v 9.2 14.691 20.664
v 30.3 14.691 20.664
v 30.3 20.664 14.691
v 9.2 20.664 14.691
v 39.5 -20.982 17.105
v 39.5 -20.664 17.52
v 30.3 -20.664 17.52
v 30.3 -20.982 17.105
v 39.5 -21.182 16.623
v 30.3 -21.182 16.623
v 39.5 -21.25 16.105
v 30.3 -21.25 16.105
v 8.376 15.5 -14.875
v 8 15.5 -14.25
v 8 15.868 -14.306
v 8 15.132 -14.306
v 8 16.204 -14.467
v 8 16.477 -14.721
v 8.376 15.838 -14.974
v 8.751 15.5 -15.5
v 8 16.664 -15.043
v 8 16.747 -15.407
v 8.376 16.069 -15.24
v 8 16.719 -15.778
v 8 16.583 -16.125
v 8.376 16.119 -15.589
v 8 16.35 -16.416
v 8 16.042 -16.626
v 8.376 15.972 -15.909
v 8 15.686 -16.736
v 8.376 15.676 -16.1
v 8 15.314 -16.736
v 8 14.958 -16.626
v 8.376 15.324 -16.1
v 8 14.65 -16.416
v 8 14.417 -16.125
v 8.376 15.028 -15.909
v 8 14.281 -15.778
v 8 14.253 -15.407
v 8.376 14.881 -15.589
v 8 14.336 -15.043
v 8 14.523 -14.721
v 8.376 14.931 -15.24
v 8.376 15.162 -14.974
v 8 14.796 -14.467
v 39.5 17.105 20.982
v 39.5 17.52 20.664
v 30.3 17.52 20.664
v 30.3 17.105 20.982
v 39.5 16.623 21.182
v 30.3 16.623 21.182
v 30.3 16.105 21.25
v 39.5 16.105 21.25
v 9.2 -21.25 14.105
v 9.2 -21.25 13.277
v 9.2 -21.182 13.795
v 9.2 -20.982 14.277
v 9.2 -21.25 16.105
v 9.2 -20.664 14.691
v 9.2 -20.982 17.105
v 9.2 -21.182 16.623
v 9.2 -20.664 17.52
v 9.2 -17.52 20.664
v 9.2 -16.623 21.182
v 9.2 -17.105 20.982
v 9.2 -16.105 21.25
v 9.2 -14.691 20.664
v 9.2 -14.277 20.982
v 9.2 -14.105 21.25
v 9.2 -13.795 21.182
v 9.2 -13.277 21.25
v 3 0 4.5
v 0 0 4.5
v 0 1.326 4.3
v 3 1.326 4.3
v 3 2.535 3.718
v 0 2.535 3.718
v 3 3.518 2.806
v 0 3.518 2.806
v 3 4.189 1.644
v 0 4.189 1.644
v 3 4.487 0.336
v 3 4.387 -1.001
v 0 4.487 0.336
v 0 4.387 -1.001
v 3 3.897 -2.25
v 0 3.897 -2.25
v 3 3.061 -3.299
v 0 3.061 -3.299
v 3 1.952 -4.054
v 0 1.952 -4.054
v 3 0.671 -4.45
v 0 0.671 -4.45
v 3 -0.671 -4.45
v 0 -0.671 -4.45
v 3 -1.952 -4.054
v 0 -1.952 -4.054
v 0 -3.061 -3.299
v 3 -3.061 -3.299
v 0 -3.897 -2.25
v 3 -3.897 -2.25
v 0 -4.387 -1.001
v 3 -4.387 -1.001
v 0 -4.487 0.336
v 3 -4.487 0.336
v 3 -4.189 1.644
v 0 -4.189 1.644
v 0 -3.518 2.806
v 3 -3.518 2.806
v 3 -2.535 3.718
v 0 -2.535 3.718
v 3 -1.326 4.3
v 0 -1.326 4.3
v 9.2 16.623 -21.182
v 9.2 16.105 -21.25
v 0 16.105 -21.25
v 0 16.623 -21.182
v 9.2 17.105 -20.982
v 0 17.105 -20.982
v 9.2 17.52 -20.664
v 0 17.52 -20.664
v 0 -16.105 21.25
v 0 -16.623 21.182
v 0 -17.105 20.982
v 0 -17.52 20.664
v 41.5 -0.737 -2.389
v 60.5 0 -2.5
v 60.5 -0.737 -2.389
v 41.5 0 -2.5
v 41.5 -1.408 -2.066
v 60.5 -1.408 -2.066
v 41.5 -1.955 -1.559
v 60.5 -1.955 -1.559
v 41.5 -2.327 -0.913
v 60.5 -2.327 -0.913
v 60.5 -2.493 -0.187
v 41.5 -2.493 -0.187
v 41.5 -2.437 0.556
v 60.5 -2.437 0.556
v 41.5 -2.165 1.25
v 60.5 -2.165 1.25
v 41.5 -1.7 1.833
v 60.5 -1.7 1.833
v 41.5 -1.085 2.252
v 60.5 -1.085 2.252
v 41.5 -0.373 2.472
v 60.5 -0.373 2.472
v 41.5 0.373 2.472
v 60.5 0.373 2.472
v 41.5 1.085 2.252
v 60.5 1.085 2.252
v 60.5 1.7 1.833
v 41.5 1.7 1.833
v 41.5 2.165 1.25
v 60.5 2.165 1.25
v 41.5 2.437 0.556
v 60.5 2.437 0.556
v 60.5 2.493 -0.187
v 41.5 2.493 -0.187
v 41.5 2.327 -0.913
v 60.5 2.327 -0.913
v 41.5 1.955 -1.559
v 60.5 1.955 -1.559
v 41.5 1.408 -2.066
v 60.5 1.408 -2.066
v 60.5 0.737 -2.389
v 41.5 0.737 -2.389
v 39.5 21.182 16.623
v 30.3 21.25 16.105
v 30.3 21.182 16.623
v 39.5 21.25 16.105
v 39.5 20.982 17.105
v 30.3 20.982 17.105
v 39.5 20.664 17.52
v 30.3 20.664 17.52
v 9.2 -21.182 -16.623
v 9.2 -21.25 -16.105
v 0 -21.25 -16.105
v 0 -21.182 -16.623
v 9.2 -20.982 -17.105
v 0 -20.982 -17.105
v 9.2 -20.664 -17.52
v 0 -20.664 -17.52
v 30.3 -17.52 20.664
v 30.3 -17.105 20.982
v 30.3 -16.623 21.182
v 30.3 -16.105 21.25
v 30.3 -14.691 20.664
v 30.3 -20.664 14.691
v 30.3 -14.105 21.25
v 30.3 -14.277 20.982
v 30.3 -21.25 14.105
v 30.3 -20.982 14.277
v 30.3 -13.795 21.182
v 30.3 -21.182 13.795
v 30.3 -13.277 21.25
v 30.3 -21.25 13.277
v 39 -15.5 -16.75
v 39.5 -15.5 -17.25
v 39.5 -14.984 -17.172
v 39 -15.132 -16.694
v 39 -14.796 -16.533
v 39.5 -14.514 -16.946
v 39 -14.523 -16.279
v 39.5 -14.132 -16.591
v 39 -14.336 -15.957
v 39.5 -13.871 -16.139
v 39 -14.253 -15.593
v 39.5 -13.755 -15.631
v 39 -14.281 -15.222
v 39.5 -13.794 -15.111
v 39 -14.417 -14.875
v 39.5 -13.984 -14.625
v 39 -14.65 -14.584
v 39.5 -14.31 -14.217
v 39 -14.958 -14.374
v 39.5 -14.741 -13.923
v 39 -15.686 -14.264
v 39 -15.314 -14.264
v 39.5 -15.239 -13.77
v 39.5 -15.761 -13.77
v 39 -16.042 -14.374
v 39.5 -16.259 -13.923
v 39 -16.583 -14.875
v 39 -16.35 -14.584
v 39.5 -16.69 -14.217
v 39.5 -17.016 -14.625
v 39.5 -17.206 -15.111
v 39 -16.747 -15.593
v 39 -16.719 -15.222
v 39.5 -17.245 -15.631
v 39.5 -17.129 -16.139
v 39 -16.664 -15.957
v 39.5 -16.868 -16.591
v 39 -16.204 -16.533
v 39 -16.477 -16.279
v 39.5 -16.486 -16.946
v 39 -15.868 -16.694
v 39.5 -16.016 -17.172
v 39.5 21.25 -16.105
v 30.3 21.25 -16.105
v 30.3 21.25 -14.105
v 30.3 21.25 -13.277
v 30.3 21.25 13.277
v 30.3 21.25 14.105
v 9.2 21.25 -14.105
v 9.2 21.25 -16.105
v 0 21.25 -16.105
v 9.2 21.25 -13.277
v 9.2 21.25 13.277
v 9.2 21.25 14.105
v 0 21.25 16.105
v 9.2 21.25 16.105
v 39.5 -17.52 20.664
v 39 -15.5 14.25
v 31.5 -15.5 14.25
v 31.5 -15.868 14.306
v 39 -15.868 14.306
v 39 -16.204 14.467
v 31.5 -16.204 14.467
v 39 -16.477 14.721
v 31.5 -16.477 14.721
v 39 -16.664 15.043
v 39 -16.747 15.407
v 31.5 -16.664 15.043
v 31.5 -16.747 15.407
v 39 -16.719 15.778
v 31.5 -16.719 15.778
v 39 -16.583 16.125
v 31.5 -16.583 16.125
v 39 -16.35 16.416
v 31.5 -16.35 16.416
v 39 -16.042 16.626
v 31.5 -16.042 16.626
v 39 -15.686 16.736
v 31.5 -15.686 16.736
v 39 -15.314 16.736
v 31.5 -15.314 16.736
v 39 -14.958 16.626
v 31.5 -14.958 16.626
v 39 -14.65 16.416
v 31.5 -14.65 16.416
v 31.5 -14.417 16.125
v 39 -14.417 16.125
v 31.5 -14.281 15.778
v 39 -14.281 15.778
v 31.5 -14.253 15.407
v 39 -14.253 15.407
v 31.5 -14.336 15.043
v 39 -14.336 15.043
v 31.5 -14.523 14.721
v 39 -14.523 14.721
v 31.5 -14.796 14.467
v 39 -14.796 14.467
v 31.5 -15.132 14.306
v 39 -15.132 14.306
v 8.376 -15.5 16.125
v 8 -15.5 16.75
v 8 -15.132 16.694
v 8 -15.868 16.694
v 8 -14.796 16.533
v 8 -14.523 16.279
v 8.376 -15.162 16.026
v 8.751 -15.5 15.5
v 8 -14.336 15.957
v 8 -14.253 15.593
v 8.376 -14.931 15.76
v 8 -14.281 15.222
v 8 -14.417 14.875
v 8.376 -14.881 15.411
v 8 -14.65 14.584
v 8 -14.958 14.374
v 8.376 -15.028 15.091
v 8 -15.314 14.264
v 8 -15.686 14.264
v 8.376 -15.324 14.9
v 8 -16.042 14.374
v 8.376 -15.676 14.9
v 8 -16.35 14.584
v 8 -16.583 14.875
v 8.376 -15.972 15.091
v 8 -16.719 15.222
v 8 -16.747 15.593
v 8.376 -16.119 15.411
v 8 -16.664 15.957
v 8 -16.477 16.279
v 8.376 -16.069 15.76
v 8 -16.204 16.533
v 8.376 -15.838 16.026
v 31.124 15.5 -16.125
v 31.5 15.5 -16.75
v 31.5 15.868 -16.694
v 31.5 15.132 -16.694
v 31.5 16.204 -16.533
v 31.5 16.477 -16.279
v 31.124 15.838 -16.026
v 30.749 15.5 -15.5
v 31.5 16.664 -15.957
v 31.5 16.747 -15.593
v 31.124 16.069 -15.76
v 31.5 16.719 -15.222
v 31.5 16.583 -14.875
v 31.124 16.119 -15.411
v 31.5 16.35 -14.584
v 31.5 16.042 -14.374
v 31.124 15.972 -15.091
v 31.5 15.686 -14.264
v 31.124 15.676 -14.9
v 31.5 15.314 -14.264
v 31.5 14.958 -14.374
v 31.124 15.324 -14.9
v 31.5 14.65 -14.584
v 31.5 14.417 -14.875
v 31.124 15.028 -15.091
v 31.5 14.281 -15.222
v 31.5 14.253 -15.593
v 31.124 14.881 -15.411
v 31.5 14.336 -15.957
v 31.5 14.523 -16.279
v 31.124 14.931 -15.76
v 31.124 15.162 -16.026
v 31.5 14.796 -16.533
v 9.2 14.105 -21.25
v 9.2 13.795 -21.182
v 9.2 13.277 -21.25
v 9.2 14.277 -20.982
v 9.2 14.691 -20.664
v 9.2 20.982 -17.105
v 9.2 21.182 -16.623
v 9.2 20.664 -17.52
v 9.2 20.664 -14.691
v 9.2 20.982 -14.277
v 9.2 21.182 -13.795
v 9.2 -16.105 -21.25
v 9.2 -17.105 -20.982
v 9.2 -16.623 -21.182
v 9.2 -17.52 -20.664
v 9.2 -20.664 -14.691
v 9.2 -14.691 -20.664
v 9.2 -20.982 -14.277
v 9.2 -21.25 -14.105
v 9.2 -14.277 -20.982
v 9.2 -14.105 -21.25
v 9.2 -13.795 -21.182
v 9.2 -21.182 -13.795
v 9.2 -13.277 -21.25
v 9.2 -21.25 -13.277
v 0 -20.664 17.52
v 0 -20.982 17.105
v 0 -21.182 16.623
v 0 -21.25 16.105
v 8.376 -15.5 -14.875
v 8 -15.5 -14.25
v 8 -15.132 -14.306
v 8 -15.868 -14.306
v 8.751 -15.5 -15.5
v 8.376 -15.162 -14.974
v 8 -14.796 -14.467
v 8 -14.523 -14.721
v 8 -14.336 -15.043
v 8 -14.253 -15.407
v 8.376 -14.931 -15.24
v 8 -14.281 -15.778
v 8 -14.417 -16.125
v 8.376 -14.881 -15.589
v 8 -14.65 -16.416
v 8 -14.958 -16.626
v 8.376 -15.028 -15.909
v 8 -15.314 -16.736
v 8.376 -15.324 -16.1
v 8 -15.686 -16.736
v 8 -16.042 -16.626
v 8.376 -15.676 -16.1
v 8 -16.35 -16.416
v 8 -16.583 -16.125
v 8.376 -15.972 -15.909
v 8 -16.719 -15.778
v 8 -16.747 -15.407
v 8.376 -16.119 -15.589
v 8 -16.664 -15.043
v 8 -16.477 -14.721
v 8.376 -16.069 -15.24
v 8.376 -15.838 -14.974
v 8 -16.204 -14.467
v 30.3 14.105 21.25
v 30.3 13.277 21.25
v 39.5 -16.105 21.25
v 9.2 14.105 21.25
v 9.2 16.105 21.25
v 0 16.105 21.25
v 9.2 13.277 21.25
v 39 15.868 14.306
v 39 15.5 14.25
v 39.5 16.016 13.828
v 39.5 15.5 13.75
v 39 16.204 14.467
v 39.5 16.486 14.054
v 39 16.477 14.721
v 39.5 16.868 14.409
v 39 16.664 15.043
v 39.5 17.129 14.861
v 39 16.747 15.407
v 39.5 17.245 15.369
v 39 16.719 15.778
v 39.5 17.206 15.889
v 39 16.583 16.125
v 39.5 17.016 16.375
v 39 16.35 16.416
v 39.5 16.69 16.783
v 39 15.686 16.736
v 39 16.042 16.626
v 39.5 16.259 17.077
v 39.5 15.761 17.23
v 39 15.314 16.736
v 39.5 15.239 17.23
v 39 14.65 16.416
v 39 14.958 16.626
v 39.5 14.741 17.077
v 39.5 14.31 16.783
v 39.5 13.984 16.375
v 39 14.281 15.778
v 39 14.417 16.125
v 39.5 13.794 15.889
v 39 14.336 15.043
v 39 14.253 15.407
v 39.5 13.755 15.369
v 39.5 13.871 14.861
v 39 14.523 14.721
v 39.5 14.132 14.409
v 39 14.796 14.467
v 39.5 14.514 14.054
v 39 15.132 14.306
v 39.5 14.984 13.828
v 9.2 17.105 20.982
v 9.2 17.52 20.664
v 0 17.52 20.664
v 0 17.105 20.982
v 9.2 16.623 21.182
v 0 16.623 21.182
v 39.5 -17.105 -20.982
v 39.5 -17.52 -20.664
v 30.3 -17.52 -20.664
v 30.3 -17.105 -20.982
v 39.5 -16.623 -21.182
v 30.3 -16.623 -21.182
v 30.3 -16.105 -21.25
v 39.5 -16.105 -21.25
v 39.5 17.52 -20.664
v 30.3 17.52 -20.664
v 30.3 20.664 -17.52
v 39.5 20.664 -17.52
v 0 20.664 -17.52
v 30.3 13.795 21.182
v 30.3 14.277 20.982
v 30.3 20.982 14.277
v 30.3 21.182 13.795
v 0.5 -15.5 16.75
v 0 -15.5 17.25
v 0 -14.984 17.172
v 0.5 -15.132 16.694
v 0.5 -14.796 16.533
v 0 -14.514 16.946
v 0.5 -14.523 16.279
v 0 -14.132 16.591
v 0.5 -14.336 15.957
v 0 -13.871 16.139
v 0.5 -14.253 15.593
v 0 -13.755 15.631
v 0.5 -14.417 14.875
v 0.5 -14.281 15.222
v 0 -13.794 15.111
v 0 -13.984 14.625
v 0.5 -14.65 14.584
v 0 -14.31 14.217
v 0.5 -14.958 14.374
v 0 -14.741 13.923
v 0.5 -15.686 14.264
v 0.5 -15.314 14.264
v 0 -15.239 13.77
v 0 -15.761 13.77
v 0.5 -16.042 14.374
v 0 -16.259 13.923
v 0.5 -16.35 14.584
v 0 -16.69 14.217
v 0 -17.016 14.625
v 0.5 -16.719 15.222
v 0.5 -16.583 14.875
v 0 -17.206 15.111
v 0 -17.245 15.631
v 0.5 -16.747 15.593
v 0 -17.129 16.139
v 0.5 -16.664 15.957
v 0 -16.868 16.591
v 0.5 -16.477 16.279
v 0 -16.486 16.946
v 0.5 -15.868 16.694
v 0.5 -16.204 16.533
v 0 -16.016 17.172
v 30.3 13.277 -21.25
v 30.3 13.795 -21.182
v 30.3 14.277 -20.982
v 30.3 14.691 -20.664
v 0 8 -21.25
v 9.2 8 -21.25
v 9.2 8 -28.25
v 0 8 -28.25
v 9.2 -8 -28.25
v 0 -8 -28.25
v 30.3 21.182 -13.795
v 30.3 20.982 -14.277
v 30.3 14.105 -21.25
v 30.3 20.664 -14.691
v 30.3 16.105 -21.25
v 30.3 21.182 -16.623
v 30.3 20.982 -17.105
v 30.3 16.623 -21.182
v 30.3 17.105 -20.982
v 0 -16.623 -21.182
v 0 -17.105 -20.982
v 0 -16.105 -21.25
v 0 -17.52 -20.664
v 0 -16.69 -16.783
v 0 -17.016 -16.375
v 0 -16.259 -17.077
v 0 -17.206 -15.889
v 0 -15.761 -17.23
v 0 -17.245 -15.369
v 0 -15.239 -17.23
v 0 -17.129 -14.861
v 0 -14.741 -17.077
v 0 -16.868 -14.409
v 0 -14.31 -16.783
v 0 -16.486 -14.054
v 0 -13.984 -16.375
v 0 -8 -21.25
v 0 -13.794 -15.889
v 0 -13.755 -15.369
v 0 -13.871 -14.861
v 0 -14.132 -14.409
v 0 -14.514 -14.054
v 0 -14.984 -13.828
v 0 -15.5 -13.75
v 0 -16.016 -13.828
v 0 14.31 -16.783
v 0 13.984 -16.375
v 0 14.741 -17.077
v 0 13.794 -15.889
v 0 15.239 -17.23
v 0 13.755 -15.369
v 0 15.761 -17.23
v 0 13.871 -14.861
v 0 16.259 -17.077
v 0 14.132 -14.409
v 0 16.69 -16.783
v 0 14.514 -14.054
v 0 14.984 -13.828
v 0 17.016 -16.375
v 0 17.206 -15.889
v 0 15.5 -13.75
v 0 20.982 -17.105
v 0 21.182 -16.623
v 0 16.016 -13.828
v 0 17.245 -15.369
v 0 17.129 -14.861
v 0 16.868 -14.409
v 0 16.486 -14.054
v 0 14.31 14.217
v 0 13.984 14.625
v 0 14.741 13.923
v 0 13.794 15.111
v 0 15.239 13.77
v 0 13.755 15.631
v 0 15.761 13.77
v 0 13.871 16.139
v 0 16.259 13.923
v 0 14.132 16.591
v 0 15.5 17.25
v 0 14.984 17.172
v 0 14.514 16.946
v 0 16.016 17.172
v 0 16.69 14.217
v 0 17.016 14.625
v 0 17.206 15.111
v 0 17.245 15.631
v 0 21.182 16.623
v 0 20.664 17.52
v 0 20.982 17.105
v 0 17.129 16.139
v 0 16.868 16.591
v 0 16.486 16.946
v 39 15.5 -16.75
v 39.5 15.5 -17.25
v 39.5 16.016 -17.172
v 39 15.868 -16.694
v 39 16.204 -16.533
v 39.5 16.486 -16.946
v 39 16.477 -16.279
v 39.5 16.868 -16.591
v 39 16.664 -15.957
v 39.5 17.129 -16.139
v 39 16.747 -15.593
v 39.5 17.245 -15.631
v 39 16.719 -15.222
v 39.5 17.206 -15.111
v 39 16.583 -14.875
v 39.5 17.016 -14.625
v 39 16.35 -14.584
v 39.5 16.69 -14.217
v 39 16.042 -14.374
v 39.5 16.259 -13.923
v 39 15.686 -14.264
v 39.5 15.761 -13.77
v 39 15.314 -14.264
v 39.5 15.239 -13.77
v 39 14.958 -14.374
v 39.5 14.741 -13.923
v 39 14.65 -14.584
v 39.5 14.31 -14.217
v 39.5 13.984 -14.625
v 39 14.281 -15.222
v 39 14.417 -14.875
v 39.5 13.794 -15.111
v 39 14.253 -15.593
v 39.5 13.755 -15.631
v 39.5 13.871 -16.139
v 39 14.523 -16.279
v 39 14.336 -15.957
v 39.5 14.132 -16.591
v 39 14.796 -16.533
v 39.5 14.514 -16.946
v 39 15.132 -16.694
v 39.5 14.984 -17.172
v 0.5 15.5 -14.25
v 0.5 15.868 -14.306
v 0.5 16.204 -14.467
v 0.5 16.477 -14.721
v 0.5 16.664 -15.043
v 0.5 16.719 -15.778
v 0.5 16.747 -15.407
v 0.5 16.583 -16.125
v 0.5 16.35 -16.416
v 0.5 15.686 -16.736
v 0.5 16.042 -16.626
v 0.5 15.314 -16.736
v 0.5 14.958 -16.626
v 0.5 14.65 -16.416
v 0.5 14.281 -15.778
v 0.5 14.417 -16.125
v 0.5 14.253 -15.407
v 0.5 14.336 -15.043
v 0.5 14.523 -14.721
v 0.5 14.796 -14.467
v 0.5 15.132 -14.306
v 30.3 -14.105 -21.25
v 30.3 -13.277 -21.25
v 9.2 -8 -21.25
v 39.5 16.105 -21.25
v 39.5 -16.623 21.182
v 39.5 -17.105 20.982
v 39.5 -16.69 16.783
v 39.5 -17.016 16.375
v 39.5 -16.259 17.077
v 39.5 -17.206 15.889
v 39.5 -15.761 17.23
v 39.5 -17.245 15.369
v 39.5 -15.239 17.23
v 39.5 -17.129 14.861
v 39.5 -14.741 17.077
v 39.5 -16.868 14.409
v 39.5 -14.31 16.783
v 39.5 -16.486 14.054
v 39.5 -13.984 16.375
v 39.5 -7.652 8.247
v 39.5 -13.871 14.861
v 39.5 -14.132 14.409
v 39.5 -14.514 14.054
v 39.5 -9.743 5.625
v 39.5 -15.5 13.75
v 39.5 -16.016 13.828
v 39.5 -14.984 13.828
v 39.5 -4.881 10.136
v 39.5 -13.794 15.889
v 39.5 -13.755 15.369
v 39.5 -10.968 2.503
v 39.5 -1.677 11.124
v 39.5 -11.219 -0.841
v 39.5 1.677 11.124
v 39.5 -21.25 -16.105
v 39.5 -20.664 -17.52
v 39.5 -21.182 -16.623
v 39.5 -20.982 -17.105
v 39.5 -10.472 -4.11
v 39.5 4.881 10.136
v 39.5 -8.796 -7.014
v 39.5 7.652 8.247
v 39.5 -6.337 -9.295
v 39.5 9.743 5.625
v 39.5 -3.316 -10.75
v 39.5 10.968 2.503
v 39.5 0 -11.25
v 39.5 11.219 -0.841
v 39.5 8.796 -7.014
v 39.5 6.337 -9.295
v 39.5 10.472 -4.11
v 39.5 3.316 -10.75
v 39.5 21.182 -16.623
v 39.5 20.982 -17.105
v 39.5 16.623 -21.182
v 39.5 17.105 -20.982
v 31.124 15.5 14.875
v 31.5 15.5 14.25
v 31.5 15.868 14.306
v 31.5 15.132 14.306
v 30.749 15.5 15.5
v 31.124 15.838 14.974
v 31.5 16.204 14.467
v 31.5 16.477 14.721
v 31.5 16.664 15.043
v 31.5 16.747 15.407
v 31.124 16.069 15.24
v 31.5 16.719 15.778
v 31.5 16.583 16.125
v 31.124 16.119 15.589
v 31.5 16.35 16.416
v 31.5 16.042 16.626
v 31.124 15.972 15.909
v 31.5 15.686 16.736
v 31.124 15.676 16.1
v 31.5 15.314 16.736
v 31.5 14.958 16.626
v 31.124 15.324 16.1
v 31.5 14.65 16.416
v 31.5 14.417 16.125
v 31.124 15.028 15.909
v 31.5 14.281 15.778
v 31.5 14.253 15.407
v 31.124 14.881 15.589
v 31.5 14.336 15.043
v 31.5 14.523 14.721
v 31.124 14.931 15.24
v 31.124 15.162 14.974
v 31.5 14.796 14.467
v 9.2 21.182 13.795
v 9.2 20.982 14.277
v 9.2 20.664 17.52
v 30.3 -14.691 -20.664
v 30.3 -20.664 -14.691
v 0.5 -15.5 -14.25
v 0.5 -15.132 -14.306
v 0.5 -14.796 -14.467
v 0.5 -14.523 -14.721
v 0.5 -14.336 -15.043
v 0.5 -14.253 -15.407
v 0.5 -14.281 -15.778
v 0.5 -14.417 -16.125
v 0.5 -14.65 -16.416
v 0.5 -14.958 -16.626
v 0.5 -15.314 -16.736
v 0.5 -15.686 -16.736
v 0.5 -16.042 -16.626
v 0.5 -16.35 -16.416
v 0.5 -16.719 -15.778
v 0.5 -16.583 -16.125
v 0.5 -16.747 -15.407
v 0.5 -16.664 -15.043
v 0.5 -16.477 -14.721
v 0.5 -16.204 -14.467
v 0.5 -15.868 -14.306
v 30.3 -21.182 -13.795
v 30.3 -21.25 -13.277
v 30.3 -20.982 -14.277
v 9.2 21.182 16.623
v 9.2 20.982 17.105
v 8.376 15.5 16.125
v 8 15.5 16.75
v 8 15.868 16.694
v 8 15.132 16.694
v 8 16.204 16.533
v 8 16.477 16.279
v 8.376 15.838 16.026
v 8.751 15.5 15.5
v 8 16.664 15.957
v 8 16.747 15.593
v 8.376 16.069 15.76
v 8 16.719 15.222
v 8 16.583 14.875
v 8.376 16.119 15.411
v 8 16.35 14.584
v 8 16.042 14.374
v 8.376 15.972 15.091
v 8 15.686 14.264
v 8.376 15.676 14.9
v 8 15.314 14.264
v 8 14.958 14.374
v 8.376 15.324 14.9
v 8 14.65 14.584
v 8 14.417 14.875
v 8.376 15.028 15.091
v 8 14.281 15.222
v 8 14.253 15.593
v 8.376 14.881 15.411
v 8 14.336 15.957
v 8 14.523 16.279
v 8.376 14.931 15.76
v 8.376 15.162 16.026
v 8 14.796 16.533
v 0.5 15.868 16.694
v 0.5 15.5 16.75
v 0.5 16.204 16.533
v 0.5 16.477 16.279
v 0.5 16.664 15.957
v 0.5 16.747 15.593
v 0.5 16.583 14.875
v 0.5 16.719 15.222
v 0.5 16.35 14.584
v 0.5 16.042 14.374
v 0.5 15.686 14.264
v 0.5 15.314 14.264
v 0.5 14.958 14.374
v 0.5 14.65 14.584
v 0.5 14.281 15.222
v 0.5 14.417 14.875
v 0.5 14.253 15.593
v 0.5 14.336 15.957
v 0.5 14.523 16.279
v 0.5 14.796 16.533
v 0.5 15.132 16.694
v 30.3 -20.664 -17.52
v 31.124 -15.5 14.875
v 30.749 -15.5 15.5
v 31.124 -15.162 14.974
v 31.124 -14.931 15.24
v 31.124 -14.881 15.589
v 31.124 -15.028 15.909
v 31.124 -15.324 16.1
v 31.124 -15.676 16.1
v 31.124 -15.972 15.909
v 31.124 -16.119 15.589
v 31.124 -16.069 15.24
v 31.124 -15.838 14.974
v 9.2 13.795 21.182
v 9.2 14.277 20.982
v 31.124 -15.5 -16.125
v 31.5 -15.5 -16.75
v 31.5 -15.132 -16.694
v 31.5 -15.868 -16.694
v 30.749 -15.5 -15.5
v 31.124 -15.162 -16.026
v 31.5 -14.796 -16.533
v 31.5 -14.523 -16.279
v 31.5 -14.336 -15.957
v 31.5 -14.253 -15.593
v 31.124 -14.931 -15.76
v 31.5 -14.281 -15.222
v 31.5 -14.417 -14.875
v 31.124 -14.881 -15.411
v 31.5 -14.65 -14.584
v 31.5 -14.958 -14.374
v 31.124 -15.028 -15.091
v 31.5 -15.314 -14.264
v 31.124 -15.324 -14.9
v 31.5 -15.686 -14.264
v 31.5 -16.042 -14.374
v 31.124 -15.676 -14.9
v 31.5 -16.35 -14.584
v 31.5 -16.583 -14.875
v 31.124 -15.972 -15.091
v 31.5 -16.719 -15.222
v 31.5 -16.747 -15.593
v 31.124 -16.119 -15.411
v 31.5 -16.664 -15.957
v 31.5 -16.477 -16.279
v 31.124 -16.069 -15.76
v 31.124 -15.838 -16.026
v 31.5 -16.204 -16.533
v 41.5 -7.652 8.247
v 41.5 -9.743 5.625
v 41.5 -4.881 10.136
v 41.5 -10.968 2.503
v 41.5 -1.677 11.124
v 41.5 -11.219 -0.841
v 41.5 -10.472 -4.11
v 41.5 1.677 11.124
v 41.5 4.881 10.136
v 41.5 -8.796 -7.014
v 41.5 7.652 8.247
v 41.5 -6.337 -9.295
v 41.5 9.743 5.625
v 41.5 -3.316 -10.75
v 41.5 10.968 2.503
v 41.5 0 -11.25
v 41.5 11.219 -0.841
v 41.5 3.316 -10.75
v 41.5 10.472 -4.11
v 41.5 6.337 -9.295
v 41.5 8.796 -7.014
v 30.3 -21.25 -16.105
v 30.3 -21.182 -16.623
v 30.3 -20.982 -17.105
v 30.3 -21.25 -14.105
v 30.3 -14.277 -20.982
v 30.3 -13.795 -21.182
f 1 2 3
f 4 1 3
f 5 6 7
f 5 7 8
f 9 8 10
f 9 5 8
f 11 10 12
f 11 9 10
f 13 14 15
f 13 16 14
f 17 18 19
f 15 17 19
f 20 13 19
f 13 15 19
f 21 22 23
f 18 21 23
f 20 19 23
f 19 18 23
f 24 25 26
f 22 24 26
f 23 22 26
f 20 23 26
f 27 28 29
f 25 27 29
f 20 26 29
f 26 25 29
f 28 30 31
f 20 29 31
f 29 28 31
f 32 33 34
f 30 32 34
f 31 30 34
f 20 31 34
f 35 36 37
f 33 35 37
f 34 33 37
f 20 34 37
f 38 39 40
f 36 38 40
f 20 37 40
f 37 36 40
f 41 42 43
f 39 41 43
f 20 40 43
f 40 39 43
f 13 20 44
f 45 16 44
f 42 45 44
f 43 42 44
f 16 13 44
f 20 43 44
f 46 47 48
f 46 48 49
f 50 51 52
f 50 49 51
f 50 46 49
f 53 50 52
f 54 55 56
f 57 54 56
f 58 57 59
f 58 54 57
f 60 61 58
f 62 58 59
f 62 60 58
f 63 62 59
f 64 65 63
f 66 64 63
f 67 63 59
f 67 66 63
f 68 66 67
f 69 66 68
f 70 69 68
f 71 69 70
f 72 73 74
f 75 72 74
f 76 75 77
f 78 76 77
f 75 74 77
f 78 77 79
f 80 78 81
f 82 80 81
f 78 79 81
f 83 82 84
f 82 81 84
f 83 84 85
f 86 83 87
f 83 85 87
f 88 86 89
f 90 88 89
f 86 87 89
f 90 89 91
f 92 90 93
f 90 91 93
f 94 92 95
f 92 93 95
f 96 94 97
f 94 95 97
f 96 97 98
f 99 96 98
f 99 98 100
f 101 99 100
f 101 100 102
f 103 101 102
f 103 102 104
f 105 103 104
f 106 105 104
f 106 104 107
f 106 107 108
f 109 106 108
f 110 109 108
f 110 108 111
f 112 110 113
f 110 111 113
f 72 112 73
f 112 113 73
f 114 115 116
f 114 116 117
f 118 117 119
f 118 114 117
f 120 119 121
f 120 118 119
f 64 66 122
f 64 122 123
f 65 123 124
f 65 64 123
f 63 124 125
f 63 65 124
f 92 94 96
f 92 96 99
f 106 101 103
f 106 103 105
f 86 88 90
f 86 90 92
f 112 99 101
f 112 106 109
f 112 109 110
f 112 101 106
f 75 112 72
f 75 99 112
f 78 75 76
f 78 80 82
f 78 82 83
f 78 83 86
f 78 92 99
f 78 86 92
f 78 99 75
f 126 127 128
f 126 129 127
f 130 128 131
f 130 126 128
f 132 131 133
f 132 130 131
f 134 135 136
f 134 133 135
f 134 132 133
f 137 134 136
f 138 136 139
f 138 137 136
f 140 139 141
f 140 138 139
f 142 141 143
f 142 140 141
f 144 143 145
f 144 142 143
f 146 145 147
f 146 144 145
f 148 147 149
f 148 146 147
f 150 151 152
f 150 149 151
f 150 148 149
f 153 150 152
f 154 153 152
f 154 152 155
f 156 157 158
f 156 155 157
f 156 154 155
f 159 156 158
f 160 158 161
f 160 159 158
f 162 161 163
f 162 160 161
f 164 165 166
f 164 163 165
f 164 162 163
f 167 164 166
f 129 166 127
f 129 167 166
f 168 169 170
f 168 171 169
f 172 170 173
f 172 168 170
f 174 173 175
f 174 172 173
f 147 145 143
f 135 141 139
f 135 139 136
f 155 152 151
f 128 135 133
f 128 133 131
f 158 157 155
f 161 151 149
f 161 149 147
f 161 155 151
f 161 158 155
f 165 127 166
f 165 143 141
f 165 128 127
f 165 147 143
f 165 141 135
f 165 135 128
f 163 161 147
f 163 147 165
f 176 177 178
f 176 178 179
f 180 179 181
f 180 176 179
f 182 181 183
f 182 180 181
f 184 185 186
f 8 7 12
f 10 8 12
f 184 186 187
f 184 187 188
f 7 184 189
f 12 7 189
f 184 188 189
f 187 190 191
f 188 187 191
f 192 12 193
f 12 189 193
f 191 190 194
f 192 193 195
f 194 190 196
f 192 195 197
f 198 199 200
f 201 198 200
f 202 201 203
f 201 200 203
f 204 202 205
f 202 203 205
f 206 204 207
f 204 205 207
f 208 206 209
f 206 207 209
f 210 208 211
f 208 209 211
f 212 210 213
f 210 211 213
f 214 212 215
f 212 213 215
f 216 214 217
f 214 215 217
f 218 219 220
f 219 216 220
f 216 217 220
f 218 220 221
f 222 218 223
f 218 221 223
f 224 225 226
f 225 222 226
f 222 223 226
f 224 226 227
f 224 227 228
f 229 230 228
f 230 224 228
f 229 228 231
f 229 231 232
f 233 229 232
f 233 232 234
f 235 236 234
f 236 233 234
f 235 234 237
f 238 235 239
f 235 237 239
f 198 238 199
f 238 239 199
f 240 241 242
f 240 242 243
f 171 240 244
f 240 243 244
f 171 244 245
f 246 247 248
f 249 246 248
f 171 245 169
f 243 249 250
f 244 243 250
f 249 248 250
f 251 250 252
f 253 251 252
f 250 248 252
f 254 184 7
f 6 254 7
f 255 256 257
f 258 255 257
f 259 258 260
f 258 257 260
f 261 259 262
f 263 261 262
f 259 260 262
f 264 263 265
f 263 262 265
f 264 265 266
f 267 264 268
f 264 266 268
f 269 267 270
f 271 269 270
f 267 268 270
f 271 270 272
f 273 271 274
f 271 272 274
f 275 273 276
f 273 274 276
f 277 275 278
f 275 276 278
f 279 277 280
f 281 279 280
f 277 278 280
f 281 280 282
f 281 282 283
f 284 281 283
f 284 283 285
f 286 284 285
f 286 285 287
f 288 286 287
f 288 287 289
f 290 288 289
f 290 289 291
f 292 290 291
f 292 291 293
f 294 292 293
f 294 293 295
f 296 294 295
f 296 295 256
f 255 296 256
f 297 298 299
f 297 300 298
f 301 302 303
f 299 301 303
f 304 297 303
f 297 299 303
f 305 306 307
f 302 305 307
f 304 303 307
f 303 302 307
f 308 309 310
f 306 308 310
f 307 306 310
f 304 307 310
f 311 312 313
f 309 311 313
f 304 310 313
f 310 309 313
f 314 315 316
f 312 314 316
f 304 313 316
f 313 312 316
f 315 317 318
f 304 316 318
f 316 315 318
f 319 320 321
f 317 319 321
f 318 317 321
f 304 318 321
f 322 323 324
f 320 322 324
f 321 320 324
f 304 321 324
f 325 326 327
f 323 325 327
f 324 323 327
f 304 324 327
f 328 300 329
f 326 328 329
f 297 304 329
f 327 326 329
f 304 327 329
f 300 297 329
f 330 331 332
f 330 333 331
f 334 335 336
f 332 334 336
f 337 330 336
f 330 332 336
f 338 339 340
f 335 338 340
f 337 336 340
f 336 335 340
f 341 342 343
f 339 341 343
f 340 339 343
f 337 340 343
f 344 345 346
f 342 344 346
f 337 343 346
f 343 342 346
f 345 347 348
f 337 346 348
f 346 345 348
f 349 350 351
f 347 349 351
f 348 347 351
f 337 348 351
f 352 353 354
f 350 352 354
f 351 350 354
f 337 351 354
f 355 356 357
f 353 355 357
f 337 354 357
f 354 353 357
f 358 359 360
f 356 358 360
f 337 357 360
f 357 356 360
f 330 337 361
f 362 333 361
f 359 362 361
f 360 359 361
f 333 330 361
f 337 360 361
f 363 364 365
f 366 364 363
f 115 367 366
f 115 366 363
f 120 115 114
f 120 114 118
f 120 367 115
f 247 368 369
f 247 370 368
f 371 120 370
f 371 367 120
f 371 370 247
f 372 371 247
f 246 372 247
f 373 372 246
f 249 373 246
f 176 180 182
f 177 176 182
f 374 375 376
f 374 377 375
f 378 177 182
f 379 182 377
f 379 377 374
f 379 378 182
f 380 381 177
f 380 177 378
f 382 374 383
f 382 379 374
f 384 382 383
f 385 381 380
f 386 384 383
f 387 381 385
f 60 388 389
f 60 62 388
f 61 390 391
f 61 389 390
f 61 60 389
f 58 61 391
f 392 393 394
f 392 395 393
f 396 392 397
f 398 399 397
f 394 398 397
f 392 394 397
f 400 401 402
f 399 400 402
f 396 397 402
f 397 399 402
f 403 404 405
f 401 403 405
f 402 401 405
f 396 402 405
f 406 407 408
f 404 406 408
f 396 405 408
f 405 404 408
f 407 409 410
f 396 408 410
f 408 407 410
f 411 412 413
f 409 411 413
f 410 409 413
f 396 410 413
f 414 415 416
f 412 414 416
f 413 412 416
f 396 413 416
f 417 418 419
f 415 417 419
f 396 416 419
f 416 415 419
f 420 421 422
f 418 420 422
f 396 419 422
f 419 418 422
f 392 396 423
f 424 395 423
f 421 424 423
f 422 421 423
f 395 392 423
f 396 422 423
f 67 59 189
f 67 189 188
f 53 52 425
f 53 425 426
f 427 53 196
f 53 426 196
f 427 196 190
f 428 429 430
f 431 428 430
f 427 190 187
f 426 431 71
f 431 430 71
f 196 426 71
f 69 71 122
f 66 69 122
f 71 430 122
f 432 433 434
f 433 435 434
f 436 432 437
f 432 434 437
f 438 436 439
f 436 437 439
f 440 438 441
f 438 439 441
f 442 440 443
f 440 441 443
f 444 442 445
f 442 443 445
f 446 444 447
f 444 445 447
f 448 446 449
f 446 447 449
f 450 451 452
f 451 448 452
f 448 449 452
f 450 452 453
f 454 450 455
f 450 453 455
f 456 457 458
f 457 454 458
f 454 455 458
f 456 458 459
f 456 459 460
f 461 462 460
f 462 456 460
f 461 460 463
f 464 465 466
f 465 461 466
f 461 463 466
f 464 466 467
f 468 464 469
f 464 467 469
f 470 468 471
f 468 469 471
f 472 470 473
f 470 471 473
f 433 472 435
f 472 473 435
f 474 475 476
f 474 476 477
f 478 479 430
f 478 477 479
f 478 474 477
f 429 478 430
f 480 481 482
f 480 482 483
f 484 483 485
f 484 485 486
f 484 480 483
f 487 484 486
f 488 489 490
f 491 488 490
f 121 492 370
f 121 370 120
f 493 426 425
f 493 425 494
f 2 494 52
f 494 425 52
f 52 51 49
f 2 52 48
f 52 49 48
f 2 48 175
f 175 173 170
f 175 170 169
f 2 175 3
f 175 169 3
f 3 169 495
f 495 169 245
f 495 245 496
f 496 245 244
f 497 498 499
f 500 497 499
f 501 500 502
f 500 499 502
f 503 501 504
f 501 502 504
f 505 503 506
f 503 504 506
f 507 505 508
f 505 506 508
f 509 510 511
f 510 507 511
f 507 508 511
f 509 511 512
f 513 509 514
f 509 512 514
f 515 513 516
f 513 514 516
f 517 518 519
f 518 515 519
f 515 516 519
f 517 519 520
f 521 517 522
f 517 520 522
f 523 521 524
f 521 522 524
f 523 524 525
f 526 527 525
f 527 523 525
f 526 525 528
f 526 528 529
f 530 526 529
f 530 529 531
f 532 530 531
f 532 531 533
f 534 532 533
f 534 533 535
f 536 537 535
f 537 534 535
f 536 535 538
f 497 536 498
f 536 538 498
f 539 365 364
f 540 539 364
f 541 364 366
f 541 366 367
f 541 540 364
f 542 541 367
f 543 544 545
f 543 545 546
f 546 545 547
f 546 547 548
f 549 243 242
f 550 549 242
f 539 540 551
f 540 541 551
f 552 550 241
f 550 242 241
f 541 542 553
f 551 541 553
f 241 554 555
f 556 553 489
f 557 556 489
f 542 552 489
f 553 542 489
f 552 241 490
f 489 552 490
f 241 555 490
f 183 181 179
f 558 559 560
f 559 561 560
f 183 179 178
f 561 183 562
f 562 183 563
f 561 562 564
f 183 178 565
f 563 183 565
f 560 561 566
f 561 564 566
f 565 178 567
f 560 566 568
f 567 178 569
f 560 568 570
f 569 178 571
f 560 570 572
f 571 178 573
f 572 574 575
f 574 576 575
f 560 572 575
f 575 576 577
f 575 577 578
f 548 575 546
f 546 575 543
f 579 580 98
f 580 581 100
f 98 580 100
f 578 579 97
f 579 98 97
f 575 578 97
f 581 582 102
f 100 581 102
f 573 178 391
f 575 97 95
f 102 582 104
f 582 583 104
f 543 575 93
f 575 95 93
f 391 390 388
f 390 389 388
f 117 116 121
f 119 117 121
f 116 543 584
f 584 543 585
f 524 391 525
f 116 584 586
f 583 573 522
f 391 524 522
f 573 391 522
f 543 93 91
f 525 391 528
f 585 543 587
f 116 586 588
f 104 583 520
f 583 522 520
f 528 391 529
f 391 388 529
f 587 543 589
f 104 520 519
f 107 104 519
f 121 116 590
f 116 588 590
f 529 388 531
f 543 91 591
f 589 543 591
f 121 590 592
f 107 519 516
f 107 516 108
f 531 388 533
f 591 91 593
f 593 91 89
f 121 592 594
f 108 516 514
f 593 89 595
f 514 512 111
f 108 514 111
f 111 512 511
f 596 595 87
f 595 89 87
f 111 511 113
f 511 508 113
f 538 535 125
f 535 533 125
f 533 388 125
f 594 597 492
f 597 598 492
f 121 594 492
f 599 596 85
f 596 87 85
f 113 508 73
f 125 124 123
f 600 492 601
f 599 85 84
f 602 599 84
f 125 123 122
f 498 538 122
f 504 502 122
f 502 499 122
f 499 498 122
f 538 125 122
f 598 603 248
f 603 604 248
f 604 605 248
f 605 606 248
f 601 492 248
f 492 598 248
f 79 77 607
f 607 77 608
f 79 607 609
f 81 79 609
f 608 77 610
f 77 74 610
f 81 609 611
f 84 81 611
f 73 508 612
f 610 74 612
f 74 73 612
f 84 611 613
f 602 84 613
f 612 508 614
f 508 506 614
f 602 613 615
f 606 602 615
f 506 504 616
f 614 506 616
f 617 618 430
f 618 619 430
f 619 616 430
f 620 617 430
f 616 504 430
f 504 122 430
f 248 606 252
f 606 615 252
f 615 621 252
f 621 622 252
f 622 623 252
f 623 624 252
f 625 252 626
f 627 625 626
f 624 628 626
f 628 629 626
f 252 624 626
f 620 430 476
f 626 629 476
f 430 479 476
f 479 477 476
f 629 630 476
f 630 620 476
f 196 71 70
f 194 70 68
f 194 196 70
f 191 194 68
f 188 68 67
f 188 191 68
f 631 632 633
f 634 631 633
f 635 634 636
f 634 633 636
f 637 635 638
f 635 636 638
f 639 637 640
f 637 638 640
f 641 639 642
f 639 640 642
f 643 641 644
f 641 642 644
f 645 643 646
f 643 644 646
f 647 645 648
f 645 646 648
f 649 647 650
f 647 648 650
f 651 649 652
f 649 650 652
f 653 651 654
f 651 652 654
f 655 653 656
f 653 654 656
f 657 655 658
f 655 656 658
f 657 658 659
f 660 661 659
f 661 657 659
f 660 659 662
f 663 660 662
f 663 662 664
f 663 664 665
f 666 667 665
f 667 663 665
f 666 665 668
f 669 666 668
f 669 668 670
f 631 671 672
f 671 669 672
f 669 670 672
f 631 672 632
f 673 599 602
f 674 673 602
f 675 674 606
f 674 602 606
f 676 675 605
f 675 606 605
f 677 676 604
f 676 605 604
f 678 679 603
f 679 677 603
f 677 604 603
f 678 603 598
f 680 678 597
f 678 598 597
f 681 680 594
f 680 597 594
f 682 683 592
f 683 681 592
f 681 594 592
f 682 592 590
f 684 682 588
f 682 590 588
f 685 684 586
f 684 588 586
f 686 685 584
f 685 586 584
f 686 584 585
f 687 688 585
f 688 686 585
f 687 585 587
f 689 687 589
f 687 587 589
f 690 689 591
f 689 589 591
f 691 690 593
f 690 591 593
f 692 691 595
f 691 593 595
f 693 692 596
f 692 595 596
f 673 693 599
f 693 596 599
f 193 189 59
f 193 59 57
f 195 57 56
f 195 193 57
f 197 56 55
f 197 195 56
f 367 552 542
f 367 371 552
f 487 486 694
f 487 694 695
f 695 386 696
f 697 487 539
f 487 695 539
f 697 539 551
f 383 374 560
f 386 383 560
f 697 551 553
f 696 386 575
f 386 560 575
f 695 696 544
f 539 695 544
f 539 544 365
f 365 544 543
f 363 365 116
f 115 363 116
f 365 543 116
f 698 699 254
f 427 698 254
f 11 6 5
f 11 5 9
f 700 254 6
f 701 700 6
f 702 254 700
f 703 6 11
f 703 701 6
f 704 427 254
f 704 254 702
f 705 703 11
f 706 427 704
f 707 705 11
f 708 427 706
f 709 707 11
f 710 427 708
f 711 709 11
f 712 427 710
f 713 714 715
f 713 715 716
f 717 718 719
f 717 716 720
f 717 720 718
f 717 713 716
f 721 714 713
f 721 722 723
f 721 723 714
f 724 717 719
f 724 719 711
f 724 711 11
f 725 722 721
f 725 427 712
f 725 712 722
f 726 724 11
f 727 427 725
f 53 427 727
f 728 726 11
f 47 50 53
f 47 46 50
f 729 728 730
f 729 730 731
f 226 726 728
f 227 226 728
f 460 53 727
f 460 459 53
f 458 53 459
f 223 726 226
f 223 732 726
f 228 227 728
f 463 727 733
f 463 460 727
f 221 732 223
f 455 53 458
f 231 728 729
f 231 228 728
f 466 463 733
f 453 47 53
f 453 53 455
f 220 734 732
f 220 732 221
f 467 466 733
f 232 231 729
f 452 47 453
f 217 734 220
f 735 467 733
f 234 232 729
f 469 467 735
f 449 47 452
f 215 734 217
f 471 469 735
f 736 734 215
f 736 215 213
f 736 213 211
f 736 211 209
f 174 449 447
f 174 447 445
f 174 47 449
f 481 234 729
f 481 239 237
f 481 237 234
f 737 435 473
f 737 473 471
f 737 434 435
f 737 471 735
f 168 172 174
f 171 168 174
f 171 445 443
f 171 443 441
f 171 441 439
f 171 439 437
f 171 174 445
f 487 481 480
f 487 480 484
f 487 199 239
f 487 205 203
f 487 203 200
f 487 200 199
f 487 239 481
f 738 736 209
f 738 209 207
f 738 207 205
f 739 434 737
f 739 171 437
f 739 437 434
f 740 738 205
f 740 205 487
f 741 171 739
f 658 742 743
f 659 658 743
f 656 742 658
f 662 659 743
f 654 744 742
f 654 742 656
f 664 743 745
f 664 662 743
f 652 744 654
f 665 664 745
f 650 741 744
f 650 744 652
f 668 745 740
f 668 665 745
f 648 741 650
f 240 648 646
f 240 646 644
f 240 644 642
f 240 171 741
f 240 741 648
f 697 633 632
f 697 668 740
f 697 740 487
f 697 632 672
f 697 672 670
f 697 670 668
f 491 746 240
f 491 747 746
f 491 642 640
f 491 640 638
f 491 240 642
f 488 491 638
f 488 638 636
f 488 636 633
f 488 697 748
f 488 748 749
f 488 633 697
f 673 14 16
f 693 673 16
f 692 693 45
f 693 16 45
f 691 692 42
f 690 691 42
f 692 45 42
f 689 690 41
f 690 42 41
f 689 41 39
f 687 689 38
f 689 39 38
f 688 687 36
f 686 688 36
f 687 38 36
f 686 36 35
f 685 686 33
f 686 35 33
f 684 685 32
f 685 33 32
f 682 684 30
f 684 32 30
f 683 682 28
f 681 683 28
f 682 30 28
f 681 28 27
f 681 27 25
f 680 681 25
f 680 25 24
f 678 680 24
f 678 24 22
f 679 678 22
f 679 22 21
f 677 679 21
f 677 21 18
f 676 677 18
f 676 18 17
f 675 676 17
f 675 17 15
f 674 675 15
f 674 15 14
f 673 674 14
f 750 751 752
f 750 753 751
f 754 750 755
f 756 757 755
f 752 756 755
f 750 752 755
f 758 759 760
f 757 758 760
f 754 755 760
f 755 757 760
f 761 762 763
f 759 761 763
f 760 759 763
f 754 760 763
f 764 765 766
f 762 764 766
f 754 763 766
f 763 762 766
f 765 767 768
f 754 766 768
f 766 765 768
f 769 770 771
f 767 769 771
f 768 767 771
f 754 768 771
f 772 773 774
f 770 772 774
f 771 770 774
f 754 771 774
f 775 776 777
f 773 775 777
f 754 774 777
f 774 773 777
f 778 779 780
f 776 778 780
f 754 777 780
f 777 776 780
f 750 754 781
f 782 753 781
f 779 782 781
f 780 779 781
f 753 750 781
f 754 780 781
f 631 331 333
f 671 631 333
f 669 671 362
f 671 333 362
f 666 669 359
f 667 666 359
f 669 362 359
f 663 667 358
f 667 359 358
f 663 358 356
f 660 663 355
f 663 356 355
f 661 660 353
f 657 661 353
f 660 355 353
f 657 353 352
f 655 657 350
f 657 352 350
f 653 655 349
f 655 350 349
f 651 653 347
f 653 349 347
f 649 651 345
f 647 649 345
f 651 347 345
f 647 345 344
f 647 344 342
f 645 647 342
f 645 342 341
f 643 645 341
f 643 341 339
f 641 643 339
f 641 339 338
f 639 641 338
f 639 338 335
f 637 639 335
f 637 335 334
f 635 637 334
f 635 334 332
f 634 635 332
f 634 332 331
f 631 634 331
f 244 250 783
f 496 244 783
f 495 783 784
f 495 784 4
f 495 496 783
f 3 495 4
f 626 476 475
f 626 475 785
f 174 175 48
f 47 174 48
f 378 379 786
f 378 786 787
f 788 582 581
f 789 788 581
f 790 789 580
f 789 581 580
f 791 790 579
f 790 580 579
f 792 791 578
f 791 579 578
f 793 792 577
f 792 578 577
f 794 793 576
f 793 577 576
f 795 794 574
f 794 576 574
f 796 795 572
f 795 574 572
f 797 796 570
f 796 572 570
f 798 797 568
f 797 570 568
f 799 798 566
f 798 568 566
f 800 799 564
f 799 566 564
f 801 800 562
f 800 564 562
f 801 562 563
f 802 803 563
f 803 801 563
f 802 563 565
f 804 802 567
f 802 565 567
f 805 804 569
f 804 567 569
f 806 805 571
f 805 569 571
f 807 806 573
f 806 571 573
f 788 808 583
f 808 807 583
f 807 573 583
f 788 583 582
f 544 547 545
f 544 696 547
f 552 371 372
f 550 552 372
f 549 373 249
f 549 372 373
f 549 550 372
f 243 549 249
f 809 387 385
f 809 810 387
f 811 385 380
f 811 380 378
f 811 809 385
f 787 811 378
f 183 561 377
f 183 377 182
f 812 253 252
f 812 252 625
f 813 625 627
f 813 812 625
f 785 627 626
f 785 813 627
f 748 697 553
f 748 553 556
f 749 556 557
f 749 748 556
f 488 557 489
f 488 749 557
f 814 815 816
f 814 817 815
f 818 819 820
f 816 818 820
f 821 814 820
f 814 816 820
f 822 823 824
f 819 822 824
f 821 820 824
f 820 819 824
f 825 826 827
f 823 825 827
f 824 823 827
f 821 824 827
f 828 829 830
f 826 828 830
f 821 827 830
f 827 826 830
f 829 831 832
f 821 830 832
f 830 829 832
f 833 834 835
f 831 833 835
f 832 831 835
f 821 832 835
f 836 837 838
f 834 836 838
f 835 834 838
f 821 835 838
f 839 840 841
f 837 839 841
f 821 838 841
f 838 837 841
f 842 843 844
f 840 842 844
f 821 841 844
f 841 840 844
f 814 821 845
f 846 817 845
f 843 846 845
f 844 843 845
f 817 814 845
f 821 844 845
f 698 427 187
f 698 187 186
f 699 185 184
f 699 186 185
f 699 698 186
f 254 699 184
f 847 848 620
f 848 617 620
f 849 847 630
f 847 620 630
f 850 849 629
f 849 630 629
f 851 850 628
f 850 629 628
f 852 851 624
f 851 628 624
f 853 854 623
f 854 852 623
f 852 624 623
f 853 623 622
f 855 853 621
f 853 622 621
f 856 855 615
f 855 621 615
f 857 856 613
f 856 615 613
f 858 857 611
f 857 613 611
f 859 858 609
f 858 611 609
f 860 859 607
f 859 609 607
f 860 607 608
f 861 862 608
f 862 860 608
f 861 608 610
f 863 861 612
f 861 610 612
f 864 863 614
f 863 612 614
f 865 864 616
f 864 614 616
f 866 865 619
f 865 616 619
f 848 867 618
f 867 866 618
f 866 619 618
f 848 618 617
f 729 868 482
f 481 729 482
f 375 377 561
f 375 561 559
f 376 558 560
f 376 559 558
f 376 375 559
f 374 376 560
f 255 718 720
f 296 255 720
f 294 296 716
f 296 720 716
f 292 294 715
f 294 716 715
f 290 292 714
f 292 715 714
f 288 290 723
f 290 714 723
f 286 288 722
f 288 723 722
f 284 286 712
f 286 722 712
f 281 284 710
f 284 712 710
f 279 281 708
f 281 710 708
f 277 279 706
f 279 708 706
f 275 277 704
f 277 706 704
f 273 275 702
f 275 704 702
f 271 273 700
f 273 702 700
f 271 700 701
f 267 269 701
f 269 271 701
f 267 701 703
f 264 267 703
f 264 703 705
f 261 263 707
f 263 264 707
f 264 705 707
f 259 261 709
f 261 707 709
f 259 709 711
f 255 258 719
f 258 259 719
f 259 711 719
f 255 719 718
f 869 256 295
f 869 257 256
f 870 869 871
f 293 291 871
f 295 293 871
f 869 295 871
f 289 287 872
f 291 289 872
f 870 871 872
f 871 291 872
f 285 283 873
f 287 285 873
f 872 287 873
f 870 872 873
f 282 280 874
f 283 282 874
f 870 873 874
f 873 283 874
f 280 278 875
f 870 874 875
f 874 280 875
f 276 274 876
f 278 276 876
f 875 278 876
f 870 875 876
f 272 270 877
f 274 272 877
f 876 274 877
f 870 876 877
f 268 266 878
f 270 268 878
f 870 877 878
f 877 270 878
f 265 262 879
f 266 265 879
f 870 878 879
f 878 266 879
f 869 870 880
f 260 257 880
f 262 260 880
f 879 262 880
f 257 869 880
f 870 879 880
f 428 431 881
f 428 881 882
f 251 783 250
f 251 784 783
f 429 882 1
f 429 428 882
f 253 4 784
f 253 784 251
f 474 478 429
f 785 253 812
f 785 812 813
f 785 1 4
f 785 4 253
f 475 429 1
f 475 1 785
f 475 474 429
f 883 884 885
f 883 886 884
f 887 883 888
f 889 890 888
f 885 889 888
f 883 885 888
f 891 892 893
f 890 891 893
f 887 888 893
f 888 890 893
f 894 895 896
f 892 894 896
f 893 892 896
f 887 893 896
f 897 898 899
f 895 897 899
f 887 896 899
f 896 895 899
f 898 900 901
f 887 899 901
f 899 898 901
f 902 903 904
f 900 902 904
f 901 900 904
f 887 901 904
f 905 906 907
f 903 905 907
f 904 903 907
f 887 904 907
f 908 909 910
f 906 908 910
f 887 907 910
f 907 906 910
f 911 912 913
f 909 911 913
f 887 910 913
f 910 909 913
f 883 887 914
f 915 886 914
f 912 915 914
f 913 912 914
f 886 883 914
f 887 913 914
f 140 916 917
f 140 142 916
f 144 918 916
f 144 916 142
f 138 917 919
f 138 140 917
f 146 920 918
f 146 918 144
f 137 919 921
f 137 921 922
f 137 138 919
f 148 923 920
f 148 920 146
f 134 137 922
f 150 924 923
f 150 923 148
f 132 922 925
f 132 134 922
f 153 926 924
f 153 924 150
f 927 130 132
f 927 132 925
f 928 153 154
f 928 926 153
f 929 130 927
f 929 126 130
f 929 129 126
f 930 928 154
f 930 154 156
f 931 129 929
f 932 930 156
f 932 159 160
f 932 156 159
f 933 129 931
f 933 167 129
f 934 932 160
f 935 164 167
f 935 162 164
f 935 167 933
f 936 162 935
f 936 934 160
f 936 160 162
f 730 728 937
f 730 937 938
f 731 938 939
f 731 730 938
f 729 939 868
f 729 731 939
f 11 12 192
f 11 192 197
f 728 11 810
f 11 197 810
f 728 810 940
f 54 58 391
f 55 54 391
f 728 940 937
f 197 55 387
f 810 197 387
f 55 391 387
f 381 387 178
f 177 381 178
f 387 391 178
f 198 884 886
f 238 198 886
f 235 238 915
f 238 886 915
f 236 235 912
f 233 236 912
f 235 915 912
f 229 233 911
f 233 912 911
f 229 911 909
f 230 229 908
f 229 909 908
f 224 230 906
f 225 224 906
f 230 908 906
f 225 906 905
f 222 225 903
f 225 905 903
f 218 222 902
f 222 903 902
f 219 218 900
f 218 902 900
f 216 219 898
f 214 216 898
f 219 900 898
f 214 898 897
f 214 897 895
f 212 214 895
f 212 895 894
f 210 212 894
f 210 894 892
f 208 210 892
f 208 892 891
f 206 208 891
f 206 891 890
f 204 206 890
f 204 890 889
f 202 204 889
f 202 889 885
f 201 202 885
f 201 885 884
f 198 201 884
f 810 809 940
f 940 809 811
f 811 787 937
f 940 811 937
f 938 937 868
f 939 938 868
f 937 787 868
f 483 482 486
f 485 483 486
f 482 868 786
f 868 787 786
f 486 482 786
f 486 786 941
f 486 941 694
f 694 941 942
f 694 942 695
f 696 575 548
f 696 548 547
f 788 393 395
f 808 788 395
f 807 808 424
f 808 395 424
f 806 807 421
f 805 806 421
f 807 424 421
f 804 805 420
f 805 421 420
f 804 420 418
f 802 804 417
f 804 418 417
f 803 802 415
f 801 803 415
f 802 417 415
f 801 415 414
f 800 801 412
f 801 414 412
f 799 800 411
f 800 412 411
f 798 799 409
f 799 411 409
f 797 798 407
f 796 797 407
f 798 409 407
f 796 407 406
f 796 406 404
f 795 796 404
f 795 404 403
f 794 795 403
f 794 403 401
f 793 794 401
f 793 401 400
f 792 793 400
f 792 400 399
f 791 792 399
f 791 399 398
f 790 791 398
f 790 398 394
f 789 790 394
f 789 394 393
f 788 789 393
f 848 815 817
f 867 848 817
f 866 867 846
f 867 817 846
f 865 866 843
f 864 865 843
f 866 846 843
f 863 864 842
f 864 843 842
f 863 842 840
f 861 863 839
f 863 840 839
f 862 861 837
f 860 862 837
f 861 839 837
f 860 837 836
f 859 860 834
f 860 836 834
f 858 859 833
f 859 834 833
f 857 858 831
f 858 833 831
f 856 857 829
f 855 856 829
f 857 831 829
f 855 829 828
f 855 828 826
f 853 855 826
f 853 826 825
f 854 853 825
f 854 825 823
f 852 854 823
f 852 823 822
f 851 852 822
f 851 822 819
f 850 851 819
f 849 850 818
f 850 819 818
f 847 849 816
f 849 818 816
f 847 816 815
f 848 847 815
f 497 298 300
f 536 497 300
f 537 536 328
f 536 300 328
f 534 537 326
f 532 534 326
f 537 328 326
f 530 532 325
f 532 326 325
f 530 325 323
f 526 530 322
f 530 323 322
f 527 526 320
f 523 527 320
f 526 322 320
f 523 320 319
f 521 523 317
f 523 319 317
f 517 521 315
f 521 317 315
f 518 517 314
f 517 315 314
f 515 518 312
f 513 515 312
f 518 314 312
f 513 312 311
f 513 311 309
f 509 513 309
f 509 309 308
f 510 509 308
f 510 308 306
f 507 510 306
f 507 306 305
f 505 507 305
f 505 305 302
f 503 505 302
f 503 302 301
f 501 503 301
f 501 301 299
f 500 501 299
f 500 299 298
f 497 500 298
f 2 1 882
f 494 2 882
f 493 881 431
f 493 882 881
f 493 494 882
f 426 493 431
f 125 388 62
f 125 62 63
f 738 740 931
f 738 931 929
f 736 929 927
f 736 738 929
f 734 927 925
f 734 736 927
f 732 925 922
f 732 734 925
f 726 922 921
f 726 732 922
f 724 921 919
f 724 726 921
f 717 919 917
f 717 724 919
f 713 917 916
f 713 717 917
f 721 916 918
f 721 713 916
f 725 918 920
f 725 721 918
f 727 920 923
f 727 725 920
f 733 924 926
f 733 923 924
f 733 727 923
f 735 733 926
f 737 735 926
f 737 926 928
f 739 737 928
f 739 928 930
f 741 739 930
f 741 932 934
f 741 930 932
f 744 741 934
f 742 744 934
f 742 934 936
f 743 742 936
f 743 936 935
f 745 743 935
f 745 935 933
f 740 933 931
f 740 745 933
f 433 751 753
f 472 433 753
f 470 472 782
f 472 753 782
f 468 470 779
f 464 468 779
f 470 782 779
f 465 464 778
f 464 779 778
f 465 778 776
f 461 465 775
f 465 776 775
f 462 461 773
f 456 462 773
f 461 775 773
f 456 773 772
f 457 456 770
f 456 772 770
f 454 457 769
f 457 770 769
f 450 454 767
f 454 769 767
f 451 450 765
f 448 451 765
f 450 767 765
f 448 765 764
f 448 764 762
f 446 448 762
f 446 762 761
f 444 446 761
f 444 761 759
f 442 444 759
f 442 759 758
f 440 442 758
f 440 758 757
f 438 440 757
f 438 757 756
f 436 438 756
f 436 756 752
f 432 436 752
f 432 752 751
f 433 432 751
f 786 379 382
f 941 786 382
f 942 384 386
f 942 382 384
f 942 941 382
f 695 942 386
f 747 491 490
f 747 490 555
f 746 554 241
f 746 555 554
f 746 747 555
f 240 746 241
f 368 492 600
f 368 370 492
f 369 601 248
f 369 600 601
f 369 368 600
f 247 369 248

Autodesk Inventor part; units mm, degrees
ref_plane "YZ Plane" through (0, 0, 0) normal (1, 0, 0) x (0, 1, 0)
ref_plane "XZ Plane" through (0, 0, 0) normal (0, 1, 0) x (-1, 0, 0)
ref_plane "XY Plane" through (0, 0, 0) normal (0, 0, 1) x (1, 0, 0)
sketch "スケッチ1" plane through (0, 0, 0) normal (1, 0, 0) x (0, 1, 0)
  line L0 (-21.25, 21.25) -> (21.25, 21.25)
  line L1 (21.25, 21.25) -> (21.25, -21.25)
  line L2 (21.25, -21.25) -> (-21.25, -21.25)
  line L3 (-21.25, -21.25) -> (-21.25, 21.25)
  line L4 (-21.25, 21.25) -> (21.25, -21.25) construction
  line L5 (21.25, 21.25) -> (-21.25, -21.25) construction
  line L6 (16.9338, 21.25) -> (21.25, 16.9338)
  line L7 (21.25, -16.9338) -> (16.9338, -21.25)
  line L8 (-16.9338, -21.25) -> (-21.25, -16.9338)
  line L9 (-21.25, 16.9338) -> (-15.808, 22.3758)
  point P0 (0, 0)
  point P1 (0, 0)
  point P2 (0, 0)
  point P3 (-16.9338, 21.25)
  dimension "d0" = 42.5
  dimension "d1" = 42.5
  dimension "d2" = 27
  dimension "d3" = 27
  dimension "d4" = 27
  dimension "d5" = 27
extrude "押し出し1" add sketch "スケッチ1" along normal blind 9.2 contours L6 L1 L7 L2 L8 L3 L9 L0
sketch "スケッチ2" plane through (9.2, 0, 0) normal (1, 0, 0) x (0, 0, -1)
  line L0 (16.9338, 21.25) -> (-16.9338, 21.25) projected
  line L1 (-21.25, 16.9338) -> (-21.25, -16.9338) projected
  line L2 (-16.9338, -21.25) -> (16.9338, -21.25) projected
  line L3 (21.25, -16.9338) -> (21.25, 16.9338) projected
  line L4 (-21.25, 14.1053) -> (-14.1053, 21.25)
  line L5 (14.1053, 21.25) -> (21.25, 14.1053)
  line L6 (21.25, -14.1053) -> (14.1053, -21.25)
  line L7 (-14.1053, -21.25) -> (-21.25, -14.1053)
  point P0 (0, 0)
  dimension "d8" = 25
  dimension "d9" = 25
  dimension "d10" = 25
  dimension "d11" = 25
  dimension "d12" = 135
extrude "押し出し2" add sketch "スケッチ2" along normal blind 21.1
sketch "スケッチ3" plane through (30.3, 0, 0) normal (1, 0, 0) x (0, 0, -1)
  line L0 (-16.9338, -21.25) -> (16.9338, -21.25) projected
  line L1 (-21.25, -16.9338) -> (-16.9338, -21.25) projected
  line L2 (-21.25, 16.9338) -> (-21.25, -16.9338) projected
  line L3 (-16.9338, 21.25) -> (-21.25, 16.9338) projected
  line L4 (16.9338, 21.25) -> (-16.9338, 21.25) projected
  line L5 (21.25, 16.9338) -> (16.9338, 21.25) projected
  line L6 (21.25, -16.9338) -> (21.25, 16.9338) projected
  line L7 (16.9338, -21.25) -> (21.25, -16.9338) projected
  point P0 (0, 0)
extrude "押し出し3" add sketch "スケッチ3" along normal blind 9.2
sketch "スケッチ4" plane through (0, 0, 0) normal (-1, 0, 0) x (0, 0, 1)
  line L0 (15.5, 15.5) -> (-15.5, 15.5) construction
  line L1 (-15.5, 15.5) -> (-15.5, -15.5) construction
  line L2 (-15.5, -15.5) -> (15.5, -15.5) construction
  line L3 (15.5, -15.5) -> (15.5, 15.5) construction
  line L4 (15.5, 15.5) -> (-15.5, -15.5) construction
  line L5 (-15.5, 15.5) -> (15.5, -15.5) construction
  point P0 (0, 0)
  dimension "d17" = 31
  dimension "d18" = 31
hole "穴1" at (0, 15.5, -15.5) at (0, -15.5, -15.5) at (0, -15.5, 15.5) at (0, 15.5, 15.5) direction (1, 0, 0) diameter 2.5 depth 8 tip angle 118
chamfer "面取り1" distance 0.5 angle 45 4 edges at (0, -15.5, -16.75) (0, 15.5, -16.75) (0, -15.5, 14.25) (0, 15.5, 14.25)
thread "ねじ1" size "M3x0.5" class "6H" standard "ISO Metric profile" full length
thread "ねじ3" size "M3x0.5" class "6H" standard "ISO Metric profile" full length
thread "ねじ4" size "M3x0.5" class "6H" standard "ISO Metric profile" full length
thread "ねじ5" size "M3x0.5" class "6H" standard "ISO Metric profile" full length
sketch "スケッチ5" plane through (39.5, 0, 0) normal (1, 0, 0) x (0, 0, -1)
  line L0 (-15.5, -15.5) -> (15.5, -15.5) construction
  line L1 (15.5, -15.5) -> (15.5, 15.5) construction
  line L2 (15.5, 15.5) -> (-15.5, 15.5) construction
  line L3 (-15.5, 15.5) -> (-15.5, -15.5) construction
  line L4 (-15.5, -15.5) -> (15.5, 15.5) construction
  line L5 (15.5, -15.5) -> (-15.5, 15.5) construction
  point P0 (0, 0)
  dimension "d31" = 31
  dimension "d32" = 31
hole "穴2" at (39.5, -15.5, 15.5) at (39.5, -15.5, -15.5) at (39.5, 15.5, -15.5) at (39.5, 15.5, 15.5) direction (-1, 0, 0) diameter 2.5 depth 8 tip angle 118
chamfer "面取り2" distance 0.5 angle 45 4 edges at (39.5, -15.5, 16.75) (39.5, -15.5, -14.25) (39.5, 15.5, 16.75) (39.5, 15.5, -14.25)
thread "ねじ2" size "M3x0.5" class "6H" standard "ISO Metric profile" full length
thread "ねじ6" size "M3x0.5" class "6H" standard "ISO Metric profile" full length
thread "ねじ7" size "M2.6x0.45" class "6H" standard "ISO Metric profile" full length
thread "ねじ8" size "M3x0.5" class "6H" standard "ISO Metric profile" full length
sketch "スケッチ6" plane through (39.5, 0, 0) normal (1, 0, 0) x (0, 0, -1)
  circle A0 centre (0, 0) radius 11.25
  dimension "d57" = 22.5
extrude "押し出し4" add sketch "スケッチ6" along normal blind 2
sketch "スケッチ7" plane through (41.5, 0, 0) normal (1, 0, 0) x (0, 0, -1)
  circle A0 centre (0, 0) radius 2.5
  dimension "d60" = 5
extrude "押し出し5" add sketch "スケッチ7" along normal blind 19
sketch "スケッチ8" plane through (0, 0, 0) normal (-1, 0, 0) x (0, 0, 1)
  circle A0 centre (0, 0) radius 4.5
  dimension "d63" = 9
extrude "押し出し6" cut sketch "スケッチ8" against normal blind 3
sketch "スケッチ14" plane through (0, -16.9338, -21.25) normal (0, 0, -1) x (-1, 0, 0)
  line L0 (0, 0) -> (0, 33.8675) projected
  line L1 (-9.2, 0) -> (-9.2, 2.8284) projected
  line L2 (0, 8.9338) -> (-9.2, 8.9338)
  line L3 (-9.2, 8.9338) -> (-9.2, 24.9338)
  line L4 (-9.2, 24.9338) -> (0, 24.9338)
  line L5 (0, 24.9338) -> (0, 8.9338)
  point P0 (0, 16.9338)
  point P1 (-9.2, 16.9338)
  point P2 (0, 16.9338)
  point P3 (0, 16.9338)
  point P4 (0, 16.9338)
  point P5 (0, 24.9338)
  dimension "d97" = 16
extrude "押し出し10" add sketch "スケッチ14" along normal blind 7
fillet "フィレット1" radius 2 24 edges at (34.9, -16.9338, -21.25) (34.9, -21.25, -16.9338) (19.75, -14.1053, -21.25) (19.75, -21.25, -14.1053) (4.6, -16.9338, -21.25) (4.6, -21.25, -16.9338) (19.75, 14.1053, -21.25) (19.75, 21.25, -14.1053) (4.6, 21.25, -16.9338) (4.6, 16.9338, -21.25) (34.9, 16.9338, -21.25) (34.9, 21.25, -16.9338) (4.6, 21.25, 16.9338) (4.6, 16.9338, 21.25) (19.75, 14.1053, 21.25) (19.75, 21.25, 14.1053) (34.9, 21.25, 16.9338) (34.9, 16.9338, 21.25) (19.75, -14.1053, 21.25) (4.6, -16.9338, 21.25) (4.6, -21.25, 16.9338) (19.75, -21.25, 14.1053) (34.9, -16.9338, 21.25) (34.9, -21.25, 16.9338)
equation "\"d3\" = d2"
equation "\"d4\" = d2"
equation "\"d5\" = d2"
equation "\"d9\" = d8"
equation "\"d10\" = d9"
equation "\"d11\" = d8"
properties part number "stepper_motor"
